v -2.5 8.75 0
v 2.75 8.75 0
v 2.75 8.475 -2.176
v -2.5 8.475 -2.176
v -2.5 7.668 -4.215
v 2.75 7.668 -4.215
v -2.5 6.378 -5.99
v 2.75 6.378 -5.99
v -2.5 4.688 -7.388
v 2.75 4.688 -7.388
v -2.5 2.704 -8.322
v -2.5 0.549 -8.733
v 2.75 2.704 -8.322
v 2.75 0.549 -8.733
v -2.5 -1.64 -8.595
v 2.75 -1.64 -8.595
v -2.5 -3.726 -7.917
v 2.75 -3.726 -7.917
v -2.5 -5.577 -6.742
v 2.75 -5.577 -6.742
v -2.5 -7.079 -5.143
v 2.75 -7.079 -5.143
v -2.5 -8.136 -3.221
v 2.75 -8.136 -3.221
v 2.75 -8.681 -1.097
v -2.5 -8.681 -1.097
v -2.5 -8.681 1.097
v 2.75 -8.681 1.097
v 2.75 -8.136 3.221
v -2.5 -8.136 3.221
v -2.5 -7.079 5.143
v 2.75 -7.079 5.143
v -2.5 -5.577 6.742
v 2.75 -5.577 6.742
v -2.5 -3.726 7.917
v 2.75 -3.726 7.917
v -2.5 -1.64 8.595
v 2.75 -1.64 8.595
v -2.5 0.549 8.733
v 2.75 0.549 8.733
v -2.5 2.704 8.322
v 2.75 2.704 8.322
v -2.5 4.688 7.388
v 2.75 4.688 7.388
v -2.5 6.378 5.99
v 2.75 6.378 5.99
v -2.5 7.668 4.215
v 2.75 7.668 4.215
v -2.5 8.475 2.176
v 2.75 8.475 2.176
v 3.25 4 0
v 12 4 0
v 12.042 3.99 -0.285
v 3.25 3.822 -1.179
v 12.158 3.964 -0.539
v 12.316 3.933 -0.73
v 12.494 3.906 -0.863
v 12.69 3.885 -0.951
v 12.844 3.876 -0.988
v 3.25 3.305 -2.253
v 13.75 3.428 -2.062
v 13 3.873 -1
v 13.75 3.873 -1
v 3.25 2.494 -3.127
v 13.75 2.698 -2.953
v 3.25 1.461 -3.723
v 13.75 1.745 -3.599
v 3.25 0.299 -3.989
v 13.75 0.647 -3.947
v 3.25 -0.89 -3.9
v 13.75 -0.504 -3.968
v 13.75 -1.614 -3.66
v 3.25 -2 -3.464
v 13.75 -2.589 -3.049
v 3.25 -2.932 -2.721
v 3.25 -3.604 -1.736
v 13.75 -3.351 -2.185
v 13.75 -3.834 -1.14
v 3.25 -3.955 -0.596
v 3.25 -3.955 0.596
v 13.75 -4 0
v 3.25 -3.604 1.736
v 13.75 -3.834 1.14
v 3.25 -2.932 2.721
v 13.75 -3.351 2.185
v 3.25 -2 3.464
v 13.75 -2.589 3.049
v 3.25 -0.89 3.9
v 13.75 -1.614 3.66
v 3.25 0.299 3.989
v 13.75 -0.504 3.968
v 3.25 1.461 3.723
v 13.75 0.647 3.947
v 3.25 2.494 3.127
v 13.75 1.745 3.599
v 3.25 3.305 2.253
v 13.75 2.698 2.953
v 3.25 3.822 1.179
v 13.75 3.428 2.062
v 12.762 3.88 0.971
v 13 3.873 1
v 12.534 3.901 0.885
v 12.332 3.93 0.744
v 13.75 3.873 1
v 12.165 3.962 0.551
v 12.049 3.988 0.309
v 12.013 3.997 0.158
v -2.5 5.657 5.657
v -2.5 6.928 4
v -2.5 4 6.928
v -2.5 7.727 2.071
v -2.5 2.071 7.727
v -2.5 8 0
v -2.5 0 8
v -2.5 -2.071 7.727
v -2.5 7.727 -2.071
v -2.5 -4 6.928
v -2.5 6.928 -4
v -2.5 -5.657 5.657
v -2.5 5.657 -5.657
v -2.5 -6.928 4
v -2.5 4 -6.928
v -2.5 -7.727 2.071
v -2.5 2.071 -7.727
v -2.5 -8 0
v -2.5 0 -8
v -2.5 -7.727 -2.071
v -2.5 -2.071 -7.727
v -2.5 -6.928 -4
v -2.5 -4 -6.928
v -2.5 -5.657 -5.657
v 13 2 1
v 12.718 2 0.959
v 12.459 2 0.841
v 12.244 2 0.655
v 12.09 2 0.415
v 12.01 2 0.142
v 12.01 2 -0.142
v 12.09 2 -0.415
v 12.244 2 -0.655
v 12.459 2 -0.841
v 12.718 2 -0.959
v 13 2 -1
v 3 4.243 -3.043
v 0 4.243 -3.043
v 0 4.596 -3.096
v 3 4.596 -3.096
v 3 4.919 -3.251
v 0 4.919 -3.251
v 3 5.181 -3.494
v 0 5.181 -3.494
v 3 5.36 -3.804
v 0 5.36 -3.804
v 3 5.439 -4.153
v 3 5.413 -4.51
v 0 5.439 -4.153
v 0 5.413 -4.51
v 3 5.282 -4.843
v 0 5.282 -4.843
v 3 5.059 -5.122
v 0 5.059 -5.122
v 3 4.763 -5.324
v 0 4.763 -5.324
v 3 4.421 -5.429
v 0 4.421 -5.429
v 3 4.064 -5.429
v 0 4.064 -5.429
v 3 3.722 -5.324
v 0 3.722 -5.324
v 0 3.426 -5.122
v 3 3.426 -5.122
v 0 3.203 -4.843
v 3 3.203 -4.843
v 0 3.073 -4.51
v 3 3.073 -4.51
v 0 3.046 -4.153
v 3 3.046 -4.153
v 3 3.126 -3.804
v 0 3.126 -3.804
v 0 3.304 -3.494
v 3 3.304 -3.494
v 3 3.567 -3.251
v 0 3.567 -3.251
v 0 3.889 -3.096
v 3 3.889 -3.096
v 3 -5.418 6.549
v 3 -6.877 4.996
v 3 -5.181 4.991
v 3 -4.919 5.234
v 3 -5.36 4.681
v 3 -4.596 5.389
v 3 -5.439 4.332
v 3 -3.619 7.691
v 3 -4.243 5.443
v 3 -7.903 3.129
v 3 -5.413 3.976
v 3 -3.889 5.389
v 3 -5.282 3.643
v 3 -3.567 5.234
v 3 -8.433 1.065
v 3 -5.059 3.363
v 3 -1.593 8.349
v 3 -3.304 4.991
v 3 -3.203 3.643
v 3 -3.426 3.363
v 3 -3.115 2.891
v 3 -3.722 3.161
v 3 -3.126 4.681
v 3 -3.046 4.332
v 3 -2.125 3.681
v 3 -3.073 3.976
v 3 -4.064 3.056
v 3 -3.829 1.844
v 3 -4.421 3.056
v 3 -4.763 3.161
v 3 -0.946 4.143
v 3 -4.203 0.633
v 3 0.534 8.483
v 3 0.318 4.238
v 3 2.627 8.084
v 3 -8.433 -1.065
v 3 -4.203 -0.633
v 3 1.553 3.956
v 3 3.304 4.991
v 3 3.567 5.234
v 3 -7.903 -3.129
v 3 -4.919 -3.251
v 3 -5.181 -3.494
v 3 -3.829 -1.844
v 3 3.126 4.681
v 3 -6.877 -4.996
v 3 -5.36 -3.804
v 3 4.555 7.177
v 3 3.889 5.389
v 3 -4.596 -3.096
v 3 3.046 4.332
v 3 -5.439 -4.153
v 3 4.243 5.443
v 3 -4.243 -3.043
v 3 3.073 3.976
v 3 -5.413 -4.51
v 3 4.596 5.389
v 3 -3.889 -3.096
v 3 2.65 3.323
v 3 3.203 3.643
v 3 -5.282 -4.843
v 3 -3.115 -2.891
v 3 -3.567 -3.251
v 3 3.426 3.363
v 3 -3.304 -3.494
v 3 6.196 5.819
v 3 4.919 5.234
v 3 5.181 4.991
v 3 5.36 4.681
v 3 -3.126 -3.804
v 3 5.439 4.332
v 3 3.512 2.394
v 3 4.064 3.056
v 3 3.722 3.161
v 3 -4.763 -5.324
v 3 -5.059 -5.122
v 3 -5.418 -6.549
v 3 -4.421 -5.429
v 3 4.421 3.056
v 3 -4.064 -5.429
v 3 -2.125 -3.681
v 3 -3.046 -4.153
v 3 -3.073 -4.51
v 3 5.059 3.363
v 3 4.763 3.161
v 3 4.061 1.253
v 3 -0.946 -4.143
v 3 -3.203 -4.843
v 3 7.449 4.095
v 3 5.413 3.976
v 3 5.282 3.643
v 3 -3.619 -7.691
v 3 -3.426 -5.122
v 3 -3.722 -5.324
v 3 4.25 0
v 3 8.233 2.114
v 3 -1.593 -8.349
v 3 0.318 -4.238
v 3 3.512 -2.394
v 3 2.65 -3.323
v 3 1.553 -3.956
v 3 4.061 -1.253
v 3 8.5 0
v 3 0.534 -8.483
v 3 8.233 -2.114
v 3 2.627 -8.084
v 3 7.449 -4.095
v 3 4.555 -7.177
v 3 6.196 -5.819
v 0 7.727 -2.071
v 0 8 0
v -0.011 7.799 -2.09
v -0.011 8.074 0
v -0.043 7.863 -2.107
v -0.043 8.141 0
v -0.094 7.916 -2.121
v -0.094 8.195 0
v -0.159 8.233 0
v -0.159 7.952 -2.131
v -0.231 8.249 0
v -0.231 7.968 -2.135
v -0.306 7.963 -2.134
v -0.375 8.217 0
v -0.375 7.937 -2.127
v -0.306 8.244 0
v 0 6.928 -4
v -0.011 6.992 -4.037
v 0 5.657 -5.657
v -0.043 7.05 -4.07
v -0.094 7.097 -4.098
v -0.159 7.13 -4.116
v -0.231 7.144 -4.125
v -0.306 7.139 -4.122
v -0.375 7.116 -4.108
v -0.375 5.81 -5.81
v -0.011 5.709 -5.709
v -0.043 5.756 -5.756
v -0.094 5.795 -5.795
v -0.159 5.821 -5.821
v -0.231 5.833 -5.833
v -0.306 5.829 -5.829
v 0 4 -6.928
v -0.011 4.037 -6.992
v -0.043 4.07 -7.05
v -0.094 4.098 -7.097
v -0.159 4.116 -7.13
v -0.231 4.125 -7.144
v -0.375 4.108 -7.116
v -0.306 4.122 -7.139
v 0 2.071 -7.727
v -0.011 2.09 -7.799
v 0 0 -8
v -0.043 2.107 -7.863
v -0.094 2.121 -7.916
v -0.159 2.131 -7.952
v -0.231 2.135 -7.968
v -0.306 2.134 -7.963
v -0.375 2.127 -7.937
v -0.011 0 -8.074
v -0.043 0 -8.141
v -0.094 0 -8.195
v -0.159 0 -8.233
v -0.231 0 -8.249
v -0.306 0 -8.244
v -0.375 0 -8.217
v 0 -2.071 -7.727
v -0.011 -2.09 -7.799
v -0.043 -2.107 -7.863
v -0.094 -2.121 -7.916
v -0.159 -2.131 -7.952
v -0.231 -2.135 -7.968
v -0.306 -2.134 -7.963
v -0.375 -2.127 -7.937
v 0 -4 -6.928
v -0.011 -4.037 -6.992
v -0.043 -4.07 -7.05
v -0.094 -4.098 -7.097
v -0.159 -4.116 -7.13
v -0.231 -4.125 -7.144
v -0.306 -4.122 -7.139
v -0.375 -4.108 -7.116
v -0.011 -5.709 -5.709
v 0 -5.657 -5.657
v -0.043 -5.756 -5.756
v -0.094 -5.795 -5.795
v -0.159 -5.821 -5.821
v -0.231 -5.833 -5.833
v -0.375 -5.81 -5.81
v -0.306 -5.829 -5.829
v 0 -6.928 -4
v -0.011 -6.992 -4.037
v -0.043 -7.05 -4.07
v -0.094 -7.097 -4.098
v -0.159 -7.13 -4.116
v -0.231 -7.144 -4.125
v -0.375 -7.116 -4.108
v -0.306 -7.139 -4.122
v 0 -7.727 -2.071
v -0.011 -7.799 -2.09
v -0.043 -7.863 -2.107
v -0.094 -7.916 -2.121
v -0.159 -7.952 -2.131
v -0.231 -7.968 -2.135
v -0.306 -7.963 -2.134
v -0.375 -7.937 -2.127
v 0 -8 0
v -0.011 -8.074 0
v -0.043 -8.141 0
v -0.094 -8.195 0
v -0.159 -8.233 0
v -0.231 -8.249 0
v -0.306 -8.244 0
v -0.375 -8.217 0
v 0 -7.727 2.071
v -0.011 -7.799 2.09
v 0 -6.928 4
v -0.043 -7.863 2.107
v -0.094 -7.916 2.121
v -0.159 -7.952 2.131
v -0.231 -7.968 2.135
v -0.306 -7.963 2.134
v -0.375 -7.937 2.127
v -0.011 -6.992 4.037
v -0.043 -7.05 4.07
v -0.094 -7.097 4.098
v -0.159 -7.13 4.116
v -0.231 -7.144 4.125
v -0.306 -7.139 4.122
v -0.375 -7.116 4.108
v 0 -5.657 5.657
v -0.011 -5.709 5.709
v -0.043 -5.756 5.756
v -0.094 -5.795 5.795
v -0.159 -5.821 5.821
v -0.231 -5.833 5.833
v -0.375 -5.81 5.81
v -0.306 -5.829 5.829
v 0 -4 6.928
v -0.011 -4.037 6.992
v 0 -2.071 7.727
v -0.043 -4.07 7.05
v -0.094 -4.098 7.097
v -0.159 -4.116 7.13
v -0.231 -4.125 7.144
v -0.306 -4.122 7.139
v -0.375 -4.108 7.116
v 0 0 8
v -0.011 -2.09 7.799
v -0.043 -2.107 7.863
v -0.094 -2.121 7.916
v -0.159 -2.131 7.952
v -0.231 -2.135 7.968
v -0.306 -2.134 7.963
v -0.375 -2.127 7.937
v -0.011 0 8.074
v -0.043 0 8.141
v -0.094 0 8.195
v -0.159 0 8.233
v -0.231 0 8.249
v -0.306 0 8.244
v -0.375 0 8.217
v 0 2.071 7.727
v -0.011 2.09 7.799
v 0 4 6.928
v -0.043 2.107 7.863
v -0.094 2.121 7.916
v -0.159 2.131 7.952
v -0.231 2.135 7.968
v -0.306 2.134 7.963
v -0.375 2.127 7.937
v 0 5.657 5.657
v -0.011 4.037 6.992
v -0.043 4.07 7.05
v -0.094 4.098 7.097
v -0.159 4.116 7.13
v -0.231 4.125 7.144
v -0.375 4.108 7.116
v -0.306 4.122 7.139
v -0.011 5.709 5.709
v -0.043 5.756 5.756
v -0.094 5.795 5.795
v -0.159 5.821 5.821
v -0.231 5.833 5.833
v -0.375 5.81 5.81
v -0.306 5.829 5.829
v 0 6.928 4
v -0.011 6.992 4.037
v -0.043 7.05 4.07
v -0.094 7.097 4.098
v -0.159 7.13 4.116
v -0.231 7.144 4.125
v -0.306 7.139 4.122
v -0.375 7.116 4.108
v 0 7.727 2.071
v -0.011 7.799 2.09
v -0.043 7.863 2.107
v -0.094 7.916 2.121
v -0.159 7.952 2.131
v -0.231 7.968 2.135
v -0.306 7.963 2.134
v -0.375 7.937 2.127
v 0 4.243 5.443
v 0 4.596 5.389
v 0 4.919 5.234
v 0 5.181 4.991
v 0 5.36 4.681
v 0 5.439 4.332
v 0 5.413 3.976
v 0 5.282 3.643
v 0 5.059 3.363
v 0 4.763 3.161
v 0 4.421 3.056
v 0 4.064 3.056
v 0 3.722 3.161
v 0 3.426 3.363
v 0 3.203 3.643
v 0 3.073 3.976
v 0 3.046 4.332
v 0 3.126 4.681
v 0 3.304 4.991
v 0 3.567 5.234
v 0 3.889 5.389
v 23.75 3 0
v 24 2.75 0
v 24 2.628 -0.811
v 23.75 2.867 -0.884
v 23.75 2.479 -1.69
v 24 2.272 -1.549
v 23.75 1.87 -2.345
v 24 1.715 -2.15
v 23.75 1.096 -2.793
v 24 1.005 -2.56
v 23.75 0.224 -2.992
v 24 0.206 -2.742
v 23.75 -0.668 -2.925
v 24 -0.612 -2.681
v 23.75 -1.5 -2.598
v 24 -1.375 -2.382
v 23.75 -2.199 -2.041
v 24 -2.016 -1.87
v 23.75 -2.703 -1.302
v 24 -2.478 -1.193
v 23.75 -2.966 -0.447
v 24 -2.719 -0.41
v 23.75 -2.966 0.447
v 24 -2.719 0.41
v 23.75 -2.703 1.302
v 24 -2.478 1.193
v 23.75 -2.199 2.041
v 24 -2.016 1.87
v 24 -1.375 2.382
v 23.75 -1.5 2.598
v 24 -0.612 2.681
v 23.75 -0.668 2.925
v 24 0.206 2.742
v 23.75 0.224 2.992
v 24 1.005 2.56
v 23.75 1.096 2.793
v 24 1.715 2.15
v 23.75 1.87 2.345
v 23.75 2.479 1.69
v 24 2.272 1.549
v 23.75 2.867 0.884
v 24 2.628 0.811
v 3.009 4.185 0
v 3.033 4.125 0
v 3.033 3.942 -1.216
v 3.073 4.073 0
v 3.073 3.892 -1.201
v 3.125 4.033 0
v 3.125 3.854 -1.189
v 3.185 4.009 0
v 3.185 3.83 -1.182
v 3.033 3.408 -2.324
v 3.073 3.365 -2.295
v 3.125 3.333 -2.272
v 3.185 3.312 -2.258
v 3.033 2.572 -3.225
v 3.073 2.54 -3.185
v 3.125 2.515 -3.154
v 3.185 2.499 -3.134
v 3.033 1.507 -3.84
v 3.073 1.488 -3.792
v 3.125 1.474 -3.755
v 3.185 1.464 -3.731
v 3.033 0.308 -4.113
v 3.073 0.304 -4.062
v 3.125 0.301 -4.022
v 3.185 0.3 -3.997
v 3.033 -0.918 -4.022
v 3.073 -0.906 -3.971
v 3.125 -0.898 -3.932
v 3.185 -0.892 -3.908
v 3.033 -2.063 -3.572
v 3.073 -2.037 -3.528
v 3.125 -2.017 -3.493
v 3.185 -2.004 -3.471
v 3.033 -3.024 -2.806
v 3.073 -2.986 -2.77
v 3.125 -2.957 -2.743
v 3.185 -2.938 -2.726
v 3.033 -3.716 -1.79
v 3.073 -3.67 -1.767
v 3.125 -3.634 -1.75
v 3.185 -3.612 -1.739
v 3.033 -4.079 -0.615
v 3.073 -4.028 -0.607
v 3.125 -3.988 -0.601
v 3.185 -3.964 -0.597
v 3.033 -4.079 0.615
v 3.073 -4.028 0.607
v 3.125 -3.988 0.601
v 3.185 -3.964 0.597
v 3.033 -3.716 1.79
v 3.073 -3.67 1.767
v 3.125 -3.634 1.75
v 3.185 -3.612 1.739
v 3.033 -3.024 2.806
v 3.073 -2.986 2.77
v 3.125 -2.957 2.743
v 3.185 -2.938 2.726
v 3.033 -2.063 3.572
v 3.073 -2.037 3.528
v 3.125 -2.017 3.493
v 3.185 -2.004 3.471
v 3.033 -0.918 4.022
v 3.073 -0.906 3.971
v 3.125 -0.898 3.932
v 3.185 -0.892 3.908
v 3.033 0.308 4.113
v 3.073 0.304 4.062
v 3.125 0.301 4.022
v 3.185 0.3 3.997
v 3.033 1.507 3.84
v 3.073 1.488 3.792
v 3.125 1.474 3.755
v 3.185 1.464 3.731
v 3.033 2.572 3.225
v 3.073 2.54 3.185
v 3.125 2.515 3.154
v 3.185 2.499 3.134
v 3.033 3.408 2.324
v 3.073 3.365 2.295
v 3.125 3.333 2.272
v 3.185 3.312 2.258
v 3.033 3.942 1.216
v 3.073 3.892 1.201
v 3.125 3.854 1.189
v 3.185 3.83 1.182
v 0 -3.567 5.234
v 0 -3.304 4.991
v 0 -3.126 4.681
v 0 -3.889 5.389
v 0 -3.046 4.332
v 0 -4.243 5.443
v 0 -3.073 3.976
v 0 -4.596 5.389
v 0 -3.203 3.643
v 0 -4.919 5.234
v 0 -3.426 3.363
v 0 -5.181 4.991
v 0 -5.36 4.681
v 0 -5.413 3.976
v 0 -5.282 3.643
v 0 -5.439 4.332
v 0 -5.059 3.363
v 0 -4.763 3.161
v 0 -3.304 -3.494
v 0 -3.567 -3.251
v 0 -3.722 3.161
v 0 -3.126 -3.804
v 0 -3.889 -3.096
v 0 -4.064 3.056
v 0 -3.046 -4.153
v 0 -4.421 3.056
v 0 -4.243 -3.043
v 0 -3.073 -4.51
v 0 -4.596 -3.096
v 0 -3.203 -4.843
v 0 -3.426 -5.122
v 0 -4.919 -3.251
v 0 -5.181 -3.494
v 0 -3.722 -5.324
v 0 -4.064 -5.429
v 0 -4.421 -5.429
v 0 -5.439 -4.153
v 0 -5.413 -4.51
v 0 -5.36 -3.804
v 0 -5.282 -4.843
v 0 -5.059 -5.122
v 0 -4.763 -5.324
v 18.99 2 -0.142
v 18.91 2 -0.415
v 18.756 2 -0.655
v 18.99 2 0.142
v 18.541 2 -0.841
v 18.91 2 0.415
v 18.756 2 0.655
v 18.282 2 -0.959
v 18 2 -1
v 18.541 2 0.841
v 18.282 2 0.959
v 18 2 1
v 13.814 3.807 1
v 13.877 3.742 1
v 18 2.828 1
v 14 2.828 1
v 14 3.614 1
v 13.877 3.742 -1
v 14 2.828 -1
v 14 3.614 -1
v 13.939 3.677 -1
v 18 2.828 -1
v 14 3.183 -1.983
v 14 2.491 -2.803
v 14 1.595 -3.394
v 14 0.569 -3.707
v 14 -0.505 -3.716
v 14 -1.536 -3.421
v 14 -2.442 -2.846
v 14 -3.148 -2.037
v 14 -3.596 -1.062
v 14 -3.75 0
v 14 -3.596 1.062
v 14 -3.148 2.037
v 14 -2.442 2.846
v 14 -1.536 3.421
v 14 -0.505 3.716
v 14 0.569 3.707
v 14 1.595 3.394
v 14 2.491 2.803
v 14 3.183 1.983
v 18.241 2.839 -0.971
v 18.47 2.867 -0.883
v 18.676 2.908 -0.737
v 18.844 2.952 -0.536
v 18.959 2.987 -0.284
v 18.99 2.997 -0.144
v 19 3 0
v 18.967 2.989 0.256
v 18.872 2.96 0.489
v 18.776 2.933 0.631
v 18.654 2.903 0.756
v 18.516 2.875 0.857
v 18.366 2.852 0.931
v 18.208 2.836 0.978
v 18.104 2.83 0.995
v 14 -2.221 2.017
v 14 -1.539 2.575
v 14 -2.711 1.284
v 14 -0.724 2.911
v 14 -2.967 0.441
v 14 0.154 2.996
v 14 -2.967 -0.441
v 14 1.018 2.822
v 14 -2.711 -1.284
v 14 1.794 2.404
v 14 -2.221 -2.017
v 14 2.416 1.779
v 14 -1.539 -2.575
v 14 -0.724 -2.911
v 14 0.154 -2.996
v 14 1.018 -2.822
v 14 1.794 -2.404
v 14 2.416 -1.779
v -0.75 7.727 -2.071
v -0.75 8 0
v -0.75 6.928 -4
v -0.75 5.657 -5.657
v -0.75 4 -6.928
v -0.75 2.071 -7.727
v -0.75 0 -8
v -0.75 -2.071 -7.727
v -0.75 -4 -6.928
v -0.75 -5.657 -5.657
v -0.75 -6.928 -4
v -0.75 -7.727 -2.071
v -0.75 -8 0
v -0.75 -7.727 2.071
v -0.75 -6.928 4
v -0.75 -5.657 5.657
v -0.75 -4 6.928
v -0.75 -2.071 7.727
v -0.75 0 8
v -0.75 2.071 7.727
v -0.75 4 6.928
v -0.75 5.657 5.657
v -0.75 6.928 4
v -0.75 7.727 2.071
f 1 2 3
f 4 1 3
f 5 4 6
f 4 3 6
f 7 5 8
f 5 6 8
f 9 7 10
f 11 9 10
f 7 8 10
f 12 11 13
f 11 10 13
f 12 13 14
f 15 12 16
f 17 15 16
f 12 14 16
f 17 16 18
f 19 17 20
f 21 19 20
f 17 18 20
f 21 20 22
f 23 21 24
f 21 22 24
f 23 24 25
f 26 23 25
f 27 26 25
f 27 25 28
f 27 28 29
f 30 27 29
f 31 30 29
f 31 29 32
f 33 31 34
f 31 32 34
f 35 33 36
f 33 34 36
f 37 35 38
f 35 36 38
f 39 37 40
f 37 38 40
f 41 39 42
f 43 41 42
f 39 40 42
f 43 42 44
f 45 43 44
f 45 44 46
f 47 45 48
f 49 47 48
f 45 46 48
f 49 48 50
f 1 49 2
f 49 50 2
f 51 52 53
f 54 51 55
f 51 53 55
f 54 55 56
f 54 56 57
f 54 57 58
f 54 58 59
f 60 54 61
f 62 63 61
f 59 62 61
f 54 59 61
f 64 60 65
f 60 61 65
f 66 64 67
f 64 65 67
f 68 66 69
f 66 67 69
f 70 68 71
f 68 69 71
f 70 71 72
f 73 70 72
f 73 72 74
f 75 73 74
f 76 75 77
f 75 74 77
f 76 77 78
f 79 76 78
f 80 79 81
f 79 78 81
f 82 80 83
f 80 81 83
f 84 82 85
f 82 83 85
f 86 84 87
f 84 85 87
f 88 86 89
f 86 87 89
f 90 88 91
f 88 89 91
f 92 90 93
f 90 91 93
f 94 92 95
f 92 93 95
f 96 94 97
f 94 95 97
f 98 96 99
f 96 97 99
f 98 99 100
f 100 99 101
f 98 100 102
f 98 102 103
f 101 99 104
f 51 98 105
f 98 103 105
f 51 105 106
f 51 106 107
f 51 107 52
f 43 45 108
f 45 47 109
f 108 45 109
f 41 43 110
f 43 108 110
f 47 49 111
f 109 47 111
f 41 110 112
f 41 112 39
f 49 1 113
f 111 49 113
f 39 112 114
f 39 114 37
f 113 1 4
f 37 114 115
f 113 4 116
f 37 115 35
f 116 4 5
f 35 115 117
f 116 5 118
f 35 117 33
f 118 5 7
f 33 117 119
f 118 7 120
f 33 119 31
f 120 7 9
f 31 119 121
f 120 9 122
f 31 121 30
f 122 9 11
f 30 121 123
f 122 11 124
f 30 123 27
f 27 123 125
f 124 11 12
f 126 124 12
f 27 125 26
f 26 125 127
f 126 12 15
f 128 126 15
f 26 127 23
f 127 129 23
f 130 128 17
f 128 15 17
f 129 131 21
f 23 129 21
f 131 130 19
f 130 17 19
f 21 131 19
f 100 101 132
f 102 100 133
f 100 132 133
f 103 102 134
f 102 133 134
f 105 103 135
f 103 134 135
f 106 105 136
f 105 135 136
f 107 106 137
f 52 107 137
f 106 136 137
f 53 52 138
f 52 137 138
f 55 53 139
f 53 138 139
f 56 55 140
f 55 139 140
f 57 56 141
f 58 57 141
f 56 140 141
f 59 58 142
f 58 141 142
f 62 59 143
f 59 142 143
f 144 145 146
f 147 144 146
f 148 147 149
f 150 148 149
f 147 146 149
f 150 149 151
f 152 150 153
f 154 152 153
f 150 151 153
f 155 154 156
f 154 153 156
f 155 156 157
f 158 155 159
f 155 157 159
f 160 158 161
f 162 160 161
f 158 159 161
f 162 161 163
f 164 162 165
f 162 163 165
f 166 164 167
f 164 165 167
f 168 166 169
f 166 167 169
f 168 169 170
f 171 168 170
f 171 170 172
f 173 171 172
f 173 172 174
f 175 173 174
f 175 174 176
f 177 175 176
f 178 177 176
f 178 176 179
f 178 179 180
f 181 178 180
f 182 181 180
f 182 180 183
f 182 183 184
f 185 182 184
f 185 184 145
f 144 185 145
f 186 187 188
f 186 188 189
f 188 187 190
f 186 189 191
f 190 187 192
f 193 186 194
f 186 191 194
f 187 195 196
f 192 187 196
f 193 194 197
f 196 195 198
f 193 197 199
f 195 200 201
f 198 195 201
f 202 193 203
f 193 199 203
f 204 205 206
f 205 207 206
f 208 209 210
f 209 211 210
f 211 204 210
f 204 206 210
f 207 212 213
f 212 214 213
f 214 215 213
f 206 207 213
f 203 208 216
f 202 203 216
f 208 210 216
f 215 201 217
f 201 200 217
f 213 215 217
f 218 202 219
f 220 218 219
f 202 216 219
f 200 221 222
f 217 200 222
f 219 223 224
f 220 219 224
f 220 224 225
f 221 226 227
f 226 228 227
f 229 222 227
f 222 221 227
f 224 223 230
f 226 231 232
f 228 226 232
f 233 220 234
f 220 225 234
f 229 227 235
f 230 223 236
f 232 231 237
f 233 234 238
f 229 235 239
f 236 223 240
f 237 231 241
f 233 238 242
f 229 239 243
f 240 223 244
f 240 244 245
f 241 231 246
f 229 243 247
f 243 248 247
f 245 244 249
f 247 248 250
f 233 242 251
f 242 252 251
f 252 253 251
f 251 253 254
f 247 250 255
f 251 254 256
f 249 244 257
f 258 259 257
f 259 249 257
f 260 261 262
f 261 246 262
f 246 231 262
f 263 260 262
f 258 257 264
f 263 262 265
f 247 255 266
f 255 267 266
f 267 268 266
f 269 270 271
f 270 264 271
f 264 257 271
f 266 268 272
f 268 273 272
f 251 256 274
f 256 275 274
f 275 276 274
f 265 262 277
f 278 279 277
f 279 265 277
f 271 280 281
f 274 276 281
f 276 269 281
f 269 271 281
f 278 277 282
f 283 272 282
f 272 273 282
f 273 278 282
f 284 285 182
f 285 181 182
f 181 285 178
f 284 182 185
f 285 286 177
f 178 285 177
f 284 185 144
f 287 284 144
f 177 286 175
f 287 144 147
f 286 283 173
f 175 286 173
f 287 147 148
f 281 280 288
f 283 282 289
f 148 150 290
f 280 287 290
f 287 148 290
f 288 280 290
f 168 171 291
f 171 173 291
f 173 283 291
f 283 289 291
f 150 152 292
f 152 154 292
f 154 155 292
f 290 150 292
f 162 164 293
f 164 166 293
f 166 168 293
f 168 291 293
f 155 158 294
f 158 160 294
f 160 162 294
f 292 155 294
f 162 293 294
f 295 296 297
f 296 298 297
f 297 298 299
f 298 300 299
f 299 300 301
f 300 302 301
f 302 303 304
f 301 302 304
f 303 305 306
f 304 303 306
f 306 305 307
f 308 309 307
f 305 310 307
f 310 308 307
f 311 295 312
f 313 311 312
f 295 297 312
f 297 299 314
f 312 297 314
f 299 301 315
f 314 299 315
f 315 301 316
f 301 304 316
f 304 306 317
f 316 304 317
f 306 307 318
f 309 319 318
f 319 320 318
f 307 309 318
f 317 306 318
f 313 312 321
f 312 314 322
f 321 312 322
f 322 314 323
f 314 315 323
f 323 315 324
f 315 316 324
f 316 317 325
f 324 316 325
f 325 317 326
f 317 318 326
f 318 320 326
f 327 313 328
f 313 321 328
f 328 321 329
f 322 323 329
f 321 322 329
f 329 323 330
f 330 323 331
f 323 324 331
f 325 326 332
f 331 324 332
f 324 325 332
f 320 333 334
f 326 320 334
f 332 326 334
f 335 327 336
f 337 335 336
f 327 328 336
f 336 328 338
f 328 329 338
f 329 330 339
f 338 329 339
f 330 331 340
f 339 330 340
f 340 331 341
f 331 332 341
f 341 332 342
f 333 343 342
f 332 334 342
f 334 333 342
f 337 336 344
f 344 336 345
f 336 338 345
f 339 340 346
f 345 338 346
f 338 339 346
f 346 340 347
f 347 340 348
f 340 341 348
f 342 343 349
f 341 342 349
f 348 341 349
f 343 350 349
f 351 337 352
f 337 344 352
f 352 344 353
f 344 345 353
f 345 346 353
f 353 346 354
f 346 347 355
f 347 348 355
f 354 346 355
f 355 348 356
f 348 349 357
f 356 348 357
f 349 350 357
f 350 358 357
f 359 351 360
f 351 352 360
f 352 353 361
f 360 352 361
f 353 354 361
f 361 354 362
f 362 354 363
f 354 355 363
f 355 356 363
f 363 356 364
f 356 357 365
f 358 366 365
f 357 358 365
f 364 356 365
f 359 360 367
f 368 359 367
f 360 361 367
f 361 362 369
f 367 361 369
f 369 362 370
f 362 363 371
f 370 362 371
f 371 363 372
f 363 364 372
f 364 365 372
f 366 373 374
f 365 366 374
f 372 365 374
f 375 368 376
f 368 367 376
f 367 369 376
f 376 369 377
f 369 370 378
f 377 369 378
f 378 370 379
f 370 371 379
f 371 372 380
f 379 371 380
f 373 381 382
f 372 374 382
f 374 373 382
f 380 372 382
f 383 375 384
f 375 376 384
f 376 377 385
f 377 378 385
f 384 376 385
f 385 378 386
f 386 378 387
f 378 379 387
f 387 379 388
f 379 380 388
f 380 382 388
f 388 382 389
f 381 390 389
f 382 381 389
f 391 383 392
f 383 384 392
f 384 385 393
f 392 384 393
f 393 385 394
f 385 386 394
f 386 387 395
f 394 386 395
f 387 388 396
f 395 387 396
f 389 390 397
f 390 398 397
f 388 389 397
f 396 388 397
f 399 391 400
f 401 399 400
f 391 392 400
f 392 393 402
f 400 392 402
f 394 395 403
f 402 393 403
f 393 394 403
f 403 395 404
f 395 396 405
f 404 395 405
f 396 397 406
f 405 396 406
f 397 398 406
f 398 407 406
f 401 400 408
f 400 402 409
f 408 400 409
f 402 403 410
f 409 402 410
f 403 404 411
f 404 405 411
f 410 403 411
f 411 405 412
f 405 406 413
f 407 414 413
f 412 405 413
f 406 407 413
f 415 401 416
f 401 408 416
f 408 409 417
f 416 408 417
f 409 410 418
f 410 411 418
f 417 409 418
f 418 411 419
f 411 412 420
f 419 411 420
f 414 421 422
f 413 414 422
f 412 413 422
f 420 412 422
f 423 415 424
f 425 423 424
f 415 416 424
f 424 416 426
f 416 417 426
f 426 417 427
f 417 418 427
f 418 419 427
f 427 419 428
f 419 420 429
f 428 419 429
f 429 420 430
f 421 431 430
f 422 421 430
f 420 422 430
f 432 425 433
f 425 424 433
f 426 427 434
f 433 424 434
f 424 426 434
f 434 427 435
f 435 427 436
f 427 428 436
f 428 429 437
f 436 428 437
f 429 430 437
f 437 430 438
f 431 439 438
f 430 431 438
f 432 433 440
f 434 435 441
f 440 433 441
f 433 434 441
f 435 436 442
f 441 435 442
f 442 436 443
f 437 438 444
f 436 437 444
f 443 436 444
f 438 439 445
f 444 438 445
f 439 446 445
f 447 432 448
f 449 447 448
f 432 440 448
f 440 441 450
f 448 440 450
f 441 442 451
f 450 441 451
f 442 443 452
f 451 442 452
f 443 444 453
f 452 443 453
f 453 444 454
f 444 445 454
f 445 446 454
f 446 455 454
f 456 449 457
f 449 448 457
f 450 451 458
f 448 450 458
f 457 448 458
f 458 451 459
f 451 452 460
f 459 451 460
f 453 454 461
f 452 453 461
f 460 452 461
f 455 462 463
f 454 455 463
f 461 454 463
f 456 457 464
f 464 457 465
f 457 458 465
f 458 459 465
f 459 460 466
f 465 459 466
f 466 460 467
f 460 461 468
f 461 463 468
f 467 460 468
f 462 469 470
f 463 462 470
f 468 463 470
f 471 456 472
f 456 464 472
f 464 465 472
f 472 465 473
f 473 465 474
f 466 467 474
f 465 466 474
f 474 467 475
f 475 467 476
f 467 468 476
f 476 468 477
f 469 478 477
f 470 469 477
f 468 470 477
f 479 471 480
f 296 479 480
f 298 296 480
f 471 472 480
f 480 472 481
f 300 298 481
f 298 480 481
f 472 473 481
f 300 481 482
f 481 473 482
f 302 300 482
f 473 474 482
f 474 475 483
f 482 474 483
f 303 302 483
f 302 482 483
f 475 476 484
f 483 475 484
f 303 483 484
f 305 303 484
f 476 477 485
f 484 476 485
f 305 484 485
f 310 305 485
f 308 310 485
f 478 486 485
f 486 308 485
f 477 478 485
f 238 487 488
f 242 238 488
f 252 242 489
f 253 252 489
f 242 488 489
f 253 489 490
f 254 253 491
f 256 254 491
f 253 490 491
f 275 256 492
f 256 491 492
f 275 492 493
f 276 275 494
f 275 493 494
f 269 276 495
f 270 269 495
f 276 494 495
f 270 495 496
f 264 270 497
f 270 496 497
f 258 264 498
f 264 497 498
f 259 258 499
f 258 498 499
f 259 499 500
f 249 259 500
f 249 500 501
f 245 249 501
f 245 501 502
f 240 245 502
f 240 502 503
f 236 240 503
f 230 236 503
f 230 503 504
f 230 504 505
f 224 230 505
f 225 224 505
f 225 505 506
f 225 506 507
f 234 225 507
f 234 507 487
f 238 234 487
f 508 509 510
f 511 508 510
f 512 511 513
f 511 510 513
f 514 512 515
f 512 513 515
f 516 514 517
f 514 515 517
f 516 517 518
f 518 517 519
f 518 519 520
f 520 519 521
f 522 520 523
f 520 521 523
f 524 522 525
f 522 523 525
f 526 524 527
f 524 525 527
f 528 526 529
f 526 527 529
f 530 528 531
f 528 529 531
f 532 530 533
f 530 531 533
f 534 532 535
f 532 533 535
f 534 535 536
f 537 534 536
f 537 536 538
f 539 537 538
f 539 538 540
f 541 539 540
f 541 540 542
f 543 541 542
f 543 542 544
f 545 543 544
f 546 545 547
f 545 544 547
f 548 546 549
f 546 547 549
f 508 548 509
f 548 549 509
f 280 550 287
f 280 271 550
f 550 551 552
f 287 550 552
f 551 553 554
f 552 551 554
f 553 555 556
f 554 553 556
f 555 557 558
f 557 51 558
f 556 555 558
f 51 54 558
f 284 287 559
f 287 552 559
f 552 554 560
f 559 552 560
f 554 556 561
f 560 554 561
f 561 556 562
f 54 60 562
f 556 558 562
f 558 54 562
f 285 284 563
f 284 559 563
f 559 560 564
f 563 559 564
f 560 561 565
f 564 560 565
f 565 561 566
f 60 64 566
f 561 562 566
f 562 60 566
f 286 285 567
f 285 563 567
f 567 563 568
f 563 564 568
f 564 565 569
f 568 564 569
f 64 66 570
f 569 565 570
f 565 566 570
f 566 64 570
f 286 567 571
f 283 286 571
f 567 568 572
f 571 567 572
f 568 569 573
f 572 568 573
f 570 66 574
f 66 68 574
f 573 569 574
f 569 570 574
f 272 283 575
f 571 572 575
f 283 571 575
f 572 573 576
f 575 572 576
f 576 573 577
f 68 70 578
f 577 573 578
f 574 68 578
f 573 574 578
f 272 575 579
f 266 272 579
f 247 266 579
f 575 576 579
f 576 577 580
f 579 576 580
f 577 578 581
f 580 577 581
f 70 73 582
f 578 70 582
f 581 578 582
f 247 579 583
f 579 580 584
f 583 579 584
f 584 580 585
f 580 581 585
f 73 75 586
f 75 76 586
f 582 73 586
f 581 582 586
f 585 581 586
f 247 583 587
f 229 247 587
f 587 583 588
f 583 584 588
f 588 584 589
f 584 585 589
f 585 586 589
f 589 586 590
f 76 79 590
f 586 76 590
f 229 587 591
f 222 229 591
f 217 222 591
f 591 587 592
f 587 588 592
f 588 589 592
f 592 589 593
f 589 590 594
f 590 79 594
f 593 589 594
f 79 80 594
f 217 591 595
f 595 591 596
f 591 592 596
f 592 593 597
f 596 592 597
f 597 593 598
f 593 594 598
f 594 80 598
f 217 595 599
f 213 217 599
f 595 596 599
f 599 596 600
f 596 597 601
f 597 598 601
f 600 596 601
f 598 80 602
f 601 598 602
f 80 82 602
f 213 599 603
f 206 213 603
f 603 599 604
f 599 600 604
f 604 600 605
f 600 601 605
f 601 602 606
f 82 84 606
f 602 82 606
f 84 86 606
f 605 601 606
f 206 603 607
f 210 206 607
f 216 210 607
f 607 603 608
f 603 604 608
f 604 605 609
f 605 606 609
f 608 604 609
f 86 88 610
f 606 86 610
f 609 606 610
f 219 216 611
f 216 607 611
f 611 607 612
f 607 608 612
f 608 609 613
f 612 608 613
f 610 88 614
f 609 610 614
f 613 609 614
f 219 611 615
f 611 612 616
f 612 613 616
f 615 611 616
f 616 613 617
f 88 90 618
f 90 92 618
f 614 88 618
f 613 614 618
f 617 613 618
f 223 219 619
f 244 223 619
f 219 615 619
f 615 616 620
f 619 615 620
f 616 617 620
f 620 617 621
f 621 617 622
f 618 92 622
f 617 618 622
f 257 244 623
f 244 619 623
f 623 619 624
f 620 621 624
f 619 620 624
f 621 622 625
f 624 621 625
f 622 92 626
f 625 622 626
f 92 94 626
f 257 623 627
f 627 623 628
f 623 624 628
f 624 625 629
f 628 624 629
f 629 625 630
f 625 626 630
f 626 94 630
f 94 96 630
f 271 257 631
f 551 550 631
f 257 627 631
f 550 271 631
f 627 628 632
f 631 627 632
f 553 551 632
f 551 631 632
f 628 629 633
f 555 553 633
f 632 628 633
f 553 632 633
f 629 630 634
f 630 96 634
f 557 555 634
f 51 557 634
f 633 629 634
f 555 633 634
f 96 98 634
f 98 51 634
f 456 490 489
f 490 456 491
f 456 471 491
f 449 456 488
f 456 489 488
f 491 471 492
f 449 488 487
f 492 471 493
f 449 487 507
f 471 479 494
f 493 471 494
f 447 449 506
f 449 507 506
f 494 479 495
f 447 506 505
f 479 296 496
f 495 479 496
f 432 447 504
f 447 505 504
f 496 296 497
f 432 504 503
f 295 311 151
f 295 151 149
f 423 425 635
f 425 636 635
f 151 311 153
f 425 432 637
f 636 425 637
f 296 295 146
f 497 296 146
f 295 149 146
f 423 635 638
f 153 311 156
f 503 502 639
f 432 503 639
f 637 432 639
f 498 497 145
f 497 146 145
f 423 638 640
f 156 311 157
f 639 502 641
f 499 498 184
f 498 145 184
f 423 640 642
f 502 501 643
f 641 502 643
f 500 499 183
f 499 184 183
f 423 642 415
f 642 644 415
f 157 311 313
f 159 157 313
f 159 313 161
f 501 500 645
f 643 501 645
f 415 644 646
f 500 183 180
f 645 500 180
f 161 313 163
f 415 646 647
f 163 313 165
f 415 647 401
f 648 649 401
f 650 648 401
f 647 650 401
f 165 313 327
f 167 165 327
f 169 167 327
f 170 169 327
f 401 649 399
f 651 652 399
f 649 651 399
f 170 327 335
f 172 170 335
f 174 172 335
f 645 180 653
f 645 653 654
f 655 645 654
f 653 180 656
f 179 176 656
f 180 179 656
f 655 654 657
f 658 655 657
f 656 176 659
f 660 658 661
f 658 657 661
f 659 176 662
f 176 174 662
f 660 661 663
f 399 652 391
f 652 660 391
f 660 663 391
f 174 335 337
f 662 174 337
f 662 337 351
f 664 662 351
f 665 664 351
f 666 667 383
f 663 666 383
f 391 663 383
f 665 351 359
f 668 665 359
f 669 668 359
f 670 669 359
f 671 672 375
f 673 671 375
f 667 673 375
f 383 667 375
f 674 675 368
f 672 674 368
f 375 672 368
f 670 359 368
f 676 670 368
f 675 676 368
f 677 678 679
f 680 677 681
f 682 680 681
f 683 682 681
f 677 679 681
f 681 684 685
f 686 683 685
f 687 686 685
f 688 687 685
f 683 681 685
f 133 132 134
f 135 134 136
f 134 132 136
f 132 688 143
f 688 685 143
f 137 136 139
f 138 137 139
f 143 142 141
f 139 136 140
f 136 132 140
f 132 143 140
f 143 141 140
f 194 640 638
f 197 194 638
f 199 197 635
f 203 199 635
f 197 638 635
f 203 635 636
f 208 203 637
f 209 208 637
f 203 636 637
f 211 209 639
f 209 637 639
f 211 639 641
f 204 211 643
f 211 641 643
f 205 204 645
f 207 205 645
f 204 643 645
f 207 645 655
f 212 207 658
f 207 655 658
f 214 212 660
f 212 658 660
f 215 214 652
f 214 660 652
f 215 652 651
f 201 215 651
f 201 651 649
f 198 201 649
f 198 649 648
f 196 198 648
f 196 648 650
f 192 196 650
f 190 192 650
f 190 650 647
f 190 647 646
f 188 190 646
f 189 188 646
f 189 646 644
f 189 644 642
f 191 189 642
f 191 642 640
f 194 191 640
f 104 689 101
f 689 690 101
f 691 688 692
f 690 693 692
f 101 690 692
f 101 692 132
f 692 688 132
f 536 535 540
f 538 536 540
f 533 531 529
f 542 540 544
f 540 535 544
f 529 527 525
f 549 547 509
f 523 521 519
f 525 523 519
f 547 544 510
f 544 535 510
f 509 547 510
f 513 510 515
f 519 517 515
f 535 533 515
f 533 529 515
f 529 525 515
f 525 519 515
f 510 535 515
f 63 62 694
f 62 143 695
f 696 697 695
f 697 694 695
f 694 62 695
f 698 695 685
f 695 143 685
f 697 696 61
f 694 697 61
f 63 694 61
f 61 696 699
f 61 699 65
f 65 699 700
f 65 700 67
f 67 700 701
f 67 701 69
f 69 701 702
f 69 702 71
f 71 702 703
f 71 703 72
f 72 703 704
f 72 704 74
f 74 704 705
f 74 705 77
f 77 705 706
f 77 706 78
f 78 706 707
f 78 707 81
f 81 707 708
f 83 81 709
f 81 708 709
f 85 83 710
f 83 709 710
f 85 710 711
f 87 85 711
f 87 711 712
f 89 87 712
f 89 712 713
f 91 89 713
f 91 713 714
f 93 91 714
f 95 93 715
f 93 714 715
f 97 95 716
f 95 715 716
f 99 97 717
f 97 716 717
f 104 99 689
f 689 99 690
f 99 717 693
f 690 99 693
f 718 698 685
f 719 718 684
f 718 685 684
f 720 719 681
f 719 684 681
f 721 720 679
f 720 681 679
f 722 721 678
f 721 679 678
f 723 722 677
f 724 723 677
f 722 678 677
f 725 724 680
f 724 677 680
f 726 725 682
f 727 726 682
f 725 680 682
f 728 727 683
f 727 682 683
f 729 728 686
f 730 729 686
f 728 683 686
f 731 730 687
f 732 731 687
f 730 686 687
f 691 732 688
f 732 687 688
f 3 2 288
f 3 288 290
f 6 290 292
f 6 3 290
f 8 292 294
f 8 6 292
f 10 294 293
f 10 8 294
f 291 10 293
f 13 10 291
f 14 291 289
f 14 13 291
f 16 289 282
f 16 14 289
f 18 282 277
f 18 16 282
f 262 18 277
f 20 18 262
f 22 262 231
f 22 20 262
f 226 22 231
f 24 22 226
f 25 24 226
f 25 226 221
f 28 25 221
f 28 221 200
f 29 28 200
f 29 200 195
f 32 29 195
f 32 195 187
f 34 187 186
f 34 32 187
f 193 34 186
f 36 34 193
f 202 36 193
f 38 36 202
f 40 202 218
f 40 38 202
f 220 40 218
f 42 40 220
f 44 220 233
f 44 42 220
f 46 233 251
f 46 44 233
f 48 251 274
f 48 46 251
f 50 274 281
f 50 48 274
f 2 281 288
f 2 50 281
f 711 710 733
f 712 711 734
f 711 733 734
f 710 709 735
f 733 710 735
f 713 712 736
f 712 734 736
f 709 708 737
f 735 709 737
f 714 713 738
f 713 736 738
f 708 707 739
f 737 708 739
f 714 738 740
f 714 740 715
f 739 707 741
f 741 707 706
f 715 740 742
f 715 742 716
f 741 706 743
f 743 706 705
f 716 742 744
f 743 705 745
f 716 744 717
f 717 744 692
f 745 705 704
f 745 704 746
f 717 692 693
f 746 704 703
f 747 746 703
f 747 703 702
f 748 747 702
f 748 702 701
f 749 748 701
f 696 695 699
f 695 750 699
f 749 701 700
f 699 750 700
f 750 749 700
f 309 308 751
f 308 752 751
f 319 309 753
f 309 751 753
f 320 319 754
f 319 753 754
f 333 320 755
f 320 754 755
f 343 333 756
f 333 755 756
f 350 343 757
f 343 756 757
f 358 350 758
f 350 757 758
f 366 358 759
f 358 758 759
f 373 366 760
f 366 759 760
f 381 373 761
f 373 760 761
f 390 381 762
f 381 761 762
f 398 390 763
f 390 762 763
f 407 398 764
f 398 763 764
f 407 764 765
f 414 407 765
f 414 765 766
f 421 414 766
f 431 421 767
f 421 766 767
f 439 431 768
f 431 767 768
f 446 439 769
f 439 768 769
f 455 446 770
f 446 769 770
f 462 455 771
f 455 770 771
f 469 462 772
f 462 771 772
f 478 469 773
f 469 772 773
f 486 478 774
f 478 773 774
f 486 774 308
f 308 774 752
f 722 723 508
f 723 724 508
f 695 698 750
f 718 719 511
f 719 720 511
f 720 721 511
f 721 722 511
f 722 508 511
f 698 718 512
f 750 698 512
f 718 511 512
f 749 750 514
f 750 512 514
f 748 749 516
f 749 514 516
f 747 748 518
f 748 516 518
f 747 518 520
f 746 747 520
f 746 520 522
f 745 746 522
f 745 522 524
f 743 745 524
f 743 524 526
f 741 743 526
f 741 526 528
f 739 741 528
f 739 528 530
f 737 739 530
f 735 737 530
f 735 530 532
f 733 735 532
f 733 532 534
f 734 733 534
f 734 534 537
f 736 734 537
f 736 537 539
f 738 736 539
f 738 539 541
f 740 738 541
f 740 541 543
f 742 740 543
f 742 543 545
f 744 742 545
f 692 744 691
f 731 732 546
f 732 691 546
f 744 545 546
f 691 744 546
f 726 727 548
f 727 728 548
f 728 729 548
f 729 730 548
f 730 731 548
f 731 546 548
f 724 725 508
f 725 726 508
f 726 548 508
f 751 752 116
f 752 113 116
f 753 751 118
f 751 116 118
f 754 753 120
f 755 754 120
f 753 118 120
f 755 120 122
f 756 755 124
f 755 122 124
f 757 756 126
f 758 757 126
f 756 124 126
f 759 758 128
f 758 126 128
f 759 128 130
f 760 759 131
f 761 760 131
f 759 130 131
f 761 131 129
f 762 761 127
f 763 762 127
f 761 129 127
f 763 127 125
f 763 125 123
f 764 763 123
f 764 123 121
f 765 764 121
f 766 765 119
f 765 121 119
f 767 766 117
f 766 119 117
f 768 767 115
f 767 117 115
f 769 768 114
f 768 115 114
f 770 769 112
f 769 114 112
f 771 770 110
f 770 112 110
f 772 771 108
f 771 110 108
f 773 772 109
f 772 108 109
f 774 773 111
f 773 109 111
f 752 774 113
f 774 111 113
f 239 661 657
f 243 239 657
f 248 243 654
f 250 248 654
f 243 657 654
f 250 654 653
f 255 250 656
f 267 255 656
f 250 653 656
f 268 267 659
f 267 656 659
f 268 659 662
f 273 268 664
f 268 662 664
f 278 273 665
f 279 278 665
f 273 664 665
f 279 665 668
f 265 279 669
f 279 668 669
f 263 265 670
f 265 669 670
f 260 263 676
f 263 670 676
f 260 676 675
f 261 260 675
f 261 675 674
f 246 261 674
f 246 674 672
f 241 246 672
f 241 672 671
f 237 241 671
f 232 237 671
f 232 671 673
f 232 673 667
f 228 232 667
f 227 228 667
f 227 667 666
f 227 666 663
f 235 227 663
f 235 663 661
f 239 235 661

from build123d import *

# Parameters (mm, degrees)
M2_CLEARANCE_HOLE2_D = 2.4
CHAMFER2_SIZE        = 0.25
CUT_EXTRUDE1_START   = 2
CUT_EXTRUDE1_DEPTH   = 26.002314716
FILLET1_R            = 0.25


with BuildPart() as part:
    # Sketch1 → Revolve1 (revolve)
    with BuildSketch(Plane.XY):
        with BuildLine():
            Line((0, 0), (0, 8))
            ThreePointArc((0, 8), (-0.125, 8.216506351), (-0.375, 8.216506351))
            Line((-0.375, 8.216506351), (-0.75, 8))
            Line((-0.75, 8), (-2.5, 8))
            Line((-2.5, 8), (-2.5, 8.75))
            Line((-2.5, 8.75), (3, 8.75))
            Line((3, 8.75), (3, 4))
            Line((3, 4), (14, 4))
            Line((14, 4), (14, 3))
            Line((14, 3), (24, 3))
            Line((24, 3), (24, 0))
            Line((24, 0), (0, 0))
        make_face()
    revolve(axis=Axis((24, 0, 0), (-1, 0, 0)))

    # M2 Clearance Hole2 (through all)
    with Locations(Plane(origin=(3, 0, 0), x_dir=(0, 0, -1), z_dir=(1, 0, 0))):
        with Locations((4.242640687, 4.242640687), (-4.242640687, 4.242640687), (4.242640687, -4.242640687), (-4.242640687, -4.242640687)):
            Hole(M2_CLEARANCE_HOLE2_D / 2)

    # Chamfer2
    chamfer2_edges = [part.edges().sort_by_distance(p)[0] for p in [
        (3, -8.75, 0),
        (14, -4, 0),
        (24, -3, 0),
    ]]
    chamfer(chamfer2_edges, length=CHAMFER2_SIZE)

    # Sketch5 → Cut-Extrude1 (cut, through all)
    with BuildSketch(Plane(origin=(0, 0, 0), x_dir=(1, 0, 0), z_dir=(0, 1, 0)).offset(CUT_EXTRUDE1_START)):
        with BuildLine():
            Line((13, 1), (18, 1))
            ThreePointArc((18, 1), (19, 0), (18, -1))
            Line((18, -1), (13, -1))
            ThreePointArc((13, -1), (12, 0), (13, 1))
        make_face()
    extrude(amount=CUT_EXTRUDE1_DEPTH, mode=Mode.SUBTRACT)

    # Fillet1
    fillet1_edges = [part.edges().sort_by_distance(p)[0] for p in [
        (3, -4, 0),
    ]]
    fillet(fillet1_edges, radius=FILLET1_R)


solid = part.part
